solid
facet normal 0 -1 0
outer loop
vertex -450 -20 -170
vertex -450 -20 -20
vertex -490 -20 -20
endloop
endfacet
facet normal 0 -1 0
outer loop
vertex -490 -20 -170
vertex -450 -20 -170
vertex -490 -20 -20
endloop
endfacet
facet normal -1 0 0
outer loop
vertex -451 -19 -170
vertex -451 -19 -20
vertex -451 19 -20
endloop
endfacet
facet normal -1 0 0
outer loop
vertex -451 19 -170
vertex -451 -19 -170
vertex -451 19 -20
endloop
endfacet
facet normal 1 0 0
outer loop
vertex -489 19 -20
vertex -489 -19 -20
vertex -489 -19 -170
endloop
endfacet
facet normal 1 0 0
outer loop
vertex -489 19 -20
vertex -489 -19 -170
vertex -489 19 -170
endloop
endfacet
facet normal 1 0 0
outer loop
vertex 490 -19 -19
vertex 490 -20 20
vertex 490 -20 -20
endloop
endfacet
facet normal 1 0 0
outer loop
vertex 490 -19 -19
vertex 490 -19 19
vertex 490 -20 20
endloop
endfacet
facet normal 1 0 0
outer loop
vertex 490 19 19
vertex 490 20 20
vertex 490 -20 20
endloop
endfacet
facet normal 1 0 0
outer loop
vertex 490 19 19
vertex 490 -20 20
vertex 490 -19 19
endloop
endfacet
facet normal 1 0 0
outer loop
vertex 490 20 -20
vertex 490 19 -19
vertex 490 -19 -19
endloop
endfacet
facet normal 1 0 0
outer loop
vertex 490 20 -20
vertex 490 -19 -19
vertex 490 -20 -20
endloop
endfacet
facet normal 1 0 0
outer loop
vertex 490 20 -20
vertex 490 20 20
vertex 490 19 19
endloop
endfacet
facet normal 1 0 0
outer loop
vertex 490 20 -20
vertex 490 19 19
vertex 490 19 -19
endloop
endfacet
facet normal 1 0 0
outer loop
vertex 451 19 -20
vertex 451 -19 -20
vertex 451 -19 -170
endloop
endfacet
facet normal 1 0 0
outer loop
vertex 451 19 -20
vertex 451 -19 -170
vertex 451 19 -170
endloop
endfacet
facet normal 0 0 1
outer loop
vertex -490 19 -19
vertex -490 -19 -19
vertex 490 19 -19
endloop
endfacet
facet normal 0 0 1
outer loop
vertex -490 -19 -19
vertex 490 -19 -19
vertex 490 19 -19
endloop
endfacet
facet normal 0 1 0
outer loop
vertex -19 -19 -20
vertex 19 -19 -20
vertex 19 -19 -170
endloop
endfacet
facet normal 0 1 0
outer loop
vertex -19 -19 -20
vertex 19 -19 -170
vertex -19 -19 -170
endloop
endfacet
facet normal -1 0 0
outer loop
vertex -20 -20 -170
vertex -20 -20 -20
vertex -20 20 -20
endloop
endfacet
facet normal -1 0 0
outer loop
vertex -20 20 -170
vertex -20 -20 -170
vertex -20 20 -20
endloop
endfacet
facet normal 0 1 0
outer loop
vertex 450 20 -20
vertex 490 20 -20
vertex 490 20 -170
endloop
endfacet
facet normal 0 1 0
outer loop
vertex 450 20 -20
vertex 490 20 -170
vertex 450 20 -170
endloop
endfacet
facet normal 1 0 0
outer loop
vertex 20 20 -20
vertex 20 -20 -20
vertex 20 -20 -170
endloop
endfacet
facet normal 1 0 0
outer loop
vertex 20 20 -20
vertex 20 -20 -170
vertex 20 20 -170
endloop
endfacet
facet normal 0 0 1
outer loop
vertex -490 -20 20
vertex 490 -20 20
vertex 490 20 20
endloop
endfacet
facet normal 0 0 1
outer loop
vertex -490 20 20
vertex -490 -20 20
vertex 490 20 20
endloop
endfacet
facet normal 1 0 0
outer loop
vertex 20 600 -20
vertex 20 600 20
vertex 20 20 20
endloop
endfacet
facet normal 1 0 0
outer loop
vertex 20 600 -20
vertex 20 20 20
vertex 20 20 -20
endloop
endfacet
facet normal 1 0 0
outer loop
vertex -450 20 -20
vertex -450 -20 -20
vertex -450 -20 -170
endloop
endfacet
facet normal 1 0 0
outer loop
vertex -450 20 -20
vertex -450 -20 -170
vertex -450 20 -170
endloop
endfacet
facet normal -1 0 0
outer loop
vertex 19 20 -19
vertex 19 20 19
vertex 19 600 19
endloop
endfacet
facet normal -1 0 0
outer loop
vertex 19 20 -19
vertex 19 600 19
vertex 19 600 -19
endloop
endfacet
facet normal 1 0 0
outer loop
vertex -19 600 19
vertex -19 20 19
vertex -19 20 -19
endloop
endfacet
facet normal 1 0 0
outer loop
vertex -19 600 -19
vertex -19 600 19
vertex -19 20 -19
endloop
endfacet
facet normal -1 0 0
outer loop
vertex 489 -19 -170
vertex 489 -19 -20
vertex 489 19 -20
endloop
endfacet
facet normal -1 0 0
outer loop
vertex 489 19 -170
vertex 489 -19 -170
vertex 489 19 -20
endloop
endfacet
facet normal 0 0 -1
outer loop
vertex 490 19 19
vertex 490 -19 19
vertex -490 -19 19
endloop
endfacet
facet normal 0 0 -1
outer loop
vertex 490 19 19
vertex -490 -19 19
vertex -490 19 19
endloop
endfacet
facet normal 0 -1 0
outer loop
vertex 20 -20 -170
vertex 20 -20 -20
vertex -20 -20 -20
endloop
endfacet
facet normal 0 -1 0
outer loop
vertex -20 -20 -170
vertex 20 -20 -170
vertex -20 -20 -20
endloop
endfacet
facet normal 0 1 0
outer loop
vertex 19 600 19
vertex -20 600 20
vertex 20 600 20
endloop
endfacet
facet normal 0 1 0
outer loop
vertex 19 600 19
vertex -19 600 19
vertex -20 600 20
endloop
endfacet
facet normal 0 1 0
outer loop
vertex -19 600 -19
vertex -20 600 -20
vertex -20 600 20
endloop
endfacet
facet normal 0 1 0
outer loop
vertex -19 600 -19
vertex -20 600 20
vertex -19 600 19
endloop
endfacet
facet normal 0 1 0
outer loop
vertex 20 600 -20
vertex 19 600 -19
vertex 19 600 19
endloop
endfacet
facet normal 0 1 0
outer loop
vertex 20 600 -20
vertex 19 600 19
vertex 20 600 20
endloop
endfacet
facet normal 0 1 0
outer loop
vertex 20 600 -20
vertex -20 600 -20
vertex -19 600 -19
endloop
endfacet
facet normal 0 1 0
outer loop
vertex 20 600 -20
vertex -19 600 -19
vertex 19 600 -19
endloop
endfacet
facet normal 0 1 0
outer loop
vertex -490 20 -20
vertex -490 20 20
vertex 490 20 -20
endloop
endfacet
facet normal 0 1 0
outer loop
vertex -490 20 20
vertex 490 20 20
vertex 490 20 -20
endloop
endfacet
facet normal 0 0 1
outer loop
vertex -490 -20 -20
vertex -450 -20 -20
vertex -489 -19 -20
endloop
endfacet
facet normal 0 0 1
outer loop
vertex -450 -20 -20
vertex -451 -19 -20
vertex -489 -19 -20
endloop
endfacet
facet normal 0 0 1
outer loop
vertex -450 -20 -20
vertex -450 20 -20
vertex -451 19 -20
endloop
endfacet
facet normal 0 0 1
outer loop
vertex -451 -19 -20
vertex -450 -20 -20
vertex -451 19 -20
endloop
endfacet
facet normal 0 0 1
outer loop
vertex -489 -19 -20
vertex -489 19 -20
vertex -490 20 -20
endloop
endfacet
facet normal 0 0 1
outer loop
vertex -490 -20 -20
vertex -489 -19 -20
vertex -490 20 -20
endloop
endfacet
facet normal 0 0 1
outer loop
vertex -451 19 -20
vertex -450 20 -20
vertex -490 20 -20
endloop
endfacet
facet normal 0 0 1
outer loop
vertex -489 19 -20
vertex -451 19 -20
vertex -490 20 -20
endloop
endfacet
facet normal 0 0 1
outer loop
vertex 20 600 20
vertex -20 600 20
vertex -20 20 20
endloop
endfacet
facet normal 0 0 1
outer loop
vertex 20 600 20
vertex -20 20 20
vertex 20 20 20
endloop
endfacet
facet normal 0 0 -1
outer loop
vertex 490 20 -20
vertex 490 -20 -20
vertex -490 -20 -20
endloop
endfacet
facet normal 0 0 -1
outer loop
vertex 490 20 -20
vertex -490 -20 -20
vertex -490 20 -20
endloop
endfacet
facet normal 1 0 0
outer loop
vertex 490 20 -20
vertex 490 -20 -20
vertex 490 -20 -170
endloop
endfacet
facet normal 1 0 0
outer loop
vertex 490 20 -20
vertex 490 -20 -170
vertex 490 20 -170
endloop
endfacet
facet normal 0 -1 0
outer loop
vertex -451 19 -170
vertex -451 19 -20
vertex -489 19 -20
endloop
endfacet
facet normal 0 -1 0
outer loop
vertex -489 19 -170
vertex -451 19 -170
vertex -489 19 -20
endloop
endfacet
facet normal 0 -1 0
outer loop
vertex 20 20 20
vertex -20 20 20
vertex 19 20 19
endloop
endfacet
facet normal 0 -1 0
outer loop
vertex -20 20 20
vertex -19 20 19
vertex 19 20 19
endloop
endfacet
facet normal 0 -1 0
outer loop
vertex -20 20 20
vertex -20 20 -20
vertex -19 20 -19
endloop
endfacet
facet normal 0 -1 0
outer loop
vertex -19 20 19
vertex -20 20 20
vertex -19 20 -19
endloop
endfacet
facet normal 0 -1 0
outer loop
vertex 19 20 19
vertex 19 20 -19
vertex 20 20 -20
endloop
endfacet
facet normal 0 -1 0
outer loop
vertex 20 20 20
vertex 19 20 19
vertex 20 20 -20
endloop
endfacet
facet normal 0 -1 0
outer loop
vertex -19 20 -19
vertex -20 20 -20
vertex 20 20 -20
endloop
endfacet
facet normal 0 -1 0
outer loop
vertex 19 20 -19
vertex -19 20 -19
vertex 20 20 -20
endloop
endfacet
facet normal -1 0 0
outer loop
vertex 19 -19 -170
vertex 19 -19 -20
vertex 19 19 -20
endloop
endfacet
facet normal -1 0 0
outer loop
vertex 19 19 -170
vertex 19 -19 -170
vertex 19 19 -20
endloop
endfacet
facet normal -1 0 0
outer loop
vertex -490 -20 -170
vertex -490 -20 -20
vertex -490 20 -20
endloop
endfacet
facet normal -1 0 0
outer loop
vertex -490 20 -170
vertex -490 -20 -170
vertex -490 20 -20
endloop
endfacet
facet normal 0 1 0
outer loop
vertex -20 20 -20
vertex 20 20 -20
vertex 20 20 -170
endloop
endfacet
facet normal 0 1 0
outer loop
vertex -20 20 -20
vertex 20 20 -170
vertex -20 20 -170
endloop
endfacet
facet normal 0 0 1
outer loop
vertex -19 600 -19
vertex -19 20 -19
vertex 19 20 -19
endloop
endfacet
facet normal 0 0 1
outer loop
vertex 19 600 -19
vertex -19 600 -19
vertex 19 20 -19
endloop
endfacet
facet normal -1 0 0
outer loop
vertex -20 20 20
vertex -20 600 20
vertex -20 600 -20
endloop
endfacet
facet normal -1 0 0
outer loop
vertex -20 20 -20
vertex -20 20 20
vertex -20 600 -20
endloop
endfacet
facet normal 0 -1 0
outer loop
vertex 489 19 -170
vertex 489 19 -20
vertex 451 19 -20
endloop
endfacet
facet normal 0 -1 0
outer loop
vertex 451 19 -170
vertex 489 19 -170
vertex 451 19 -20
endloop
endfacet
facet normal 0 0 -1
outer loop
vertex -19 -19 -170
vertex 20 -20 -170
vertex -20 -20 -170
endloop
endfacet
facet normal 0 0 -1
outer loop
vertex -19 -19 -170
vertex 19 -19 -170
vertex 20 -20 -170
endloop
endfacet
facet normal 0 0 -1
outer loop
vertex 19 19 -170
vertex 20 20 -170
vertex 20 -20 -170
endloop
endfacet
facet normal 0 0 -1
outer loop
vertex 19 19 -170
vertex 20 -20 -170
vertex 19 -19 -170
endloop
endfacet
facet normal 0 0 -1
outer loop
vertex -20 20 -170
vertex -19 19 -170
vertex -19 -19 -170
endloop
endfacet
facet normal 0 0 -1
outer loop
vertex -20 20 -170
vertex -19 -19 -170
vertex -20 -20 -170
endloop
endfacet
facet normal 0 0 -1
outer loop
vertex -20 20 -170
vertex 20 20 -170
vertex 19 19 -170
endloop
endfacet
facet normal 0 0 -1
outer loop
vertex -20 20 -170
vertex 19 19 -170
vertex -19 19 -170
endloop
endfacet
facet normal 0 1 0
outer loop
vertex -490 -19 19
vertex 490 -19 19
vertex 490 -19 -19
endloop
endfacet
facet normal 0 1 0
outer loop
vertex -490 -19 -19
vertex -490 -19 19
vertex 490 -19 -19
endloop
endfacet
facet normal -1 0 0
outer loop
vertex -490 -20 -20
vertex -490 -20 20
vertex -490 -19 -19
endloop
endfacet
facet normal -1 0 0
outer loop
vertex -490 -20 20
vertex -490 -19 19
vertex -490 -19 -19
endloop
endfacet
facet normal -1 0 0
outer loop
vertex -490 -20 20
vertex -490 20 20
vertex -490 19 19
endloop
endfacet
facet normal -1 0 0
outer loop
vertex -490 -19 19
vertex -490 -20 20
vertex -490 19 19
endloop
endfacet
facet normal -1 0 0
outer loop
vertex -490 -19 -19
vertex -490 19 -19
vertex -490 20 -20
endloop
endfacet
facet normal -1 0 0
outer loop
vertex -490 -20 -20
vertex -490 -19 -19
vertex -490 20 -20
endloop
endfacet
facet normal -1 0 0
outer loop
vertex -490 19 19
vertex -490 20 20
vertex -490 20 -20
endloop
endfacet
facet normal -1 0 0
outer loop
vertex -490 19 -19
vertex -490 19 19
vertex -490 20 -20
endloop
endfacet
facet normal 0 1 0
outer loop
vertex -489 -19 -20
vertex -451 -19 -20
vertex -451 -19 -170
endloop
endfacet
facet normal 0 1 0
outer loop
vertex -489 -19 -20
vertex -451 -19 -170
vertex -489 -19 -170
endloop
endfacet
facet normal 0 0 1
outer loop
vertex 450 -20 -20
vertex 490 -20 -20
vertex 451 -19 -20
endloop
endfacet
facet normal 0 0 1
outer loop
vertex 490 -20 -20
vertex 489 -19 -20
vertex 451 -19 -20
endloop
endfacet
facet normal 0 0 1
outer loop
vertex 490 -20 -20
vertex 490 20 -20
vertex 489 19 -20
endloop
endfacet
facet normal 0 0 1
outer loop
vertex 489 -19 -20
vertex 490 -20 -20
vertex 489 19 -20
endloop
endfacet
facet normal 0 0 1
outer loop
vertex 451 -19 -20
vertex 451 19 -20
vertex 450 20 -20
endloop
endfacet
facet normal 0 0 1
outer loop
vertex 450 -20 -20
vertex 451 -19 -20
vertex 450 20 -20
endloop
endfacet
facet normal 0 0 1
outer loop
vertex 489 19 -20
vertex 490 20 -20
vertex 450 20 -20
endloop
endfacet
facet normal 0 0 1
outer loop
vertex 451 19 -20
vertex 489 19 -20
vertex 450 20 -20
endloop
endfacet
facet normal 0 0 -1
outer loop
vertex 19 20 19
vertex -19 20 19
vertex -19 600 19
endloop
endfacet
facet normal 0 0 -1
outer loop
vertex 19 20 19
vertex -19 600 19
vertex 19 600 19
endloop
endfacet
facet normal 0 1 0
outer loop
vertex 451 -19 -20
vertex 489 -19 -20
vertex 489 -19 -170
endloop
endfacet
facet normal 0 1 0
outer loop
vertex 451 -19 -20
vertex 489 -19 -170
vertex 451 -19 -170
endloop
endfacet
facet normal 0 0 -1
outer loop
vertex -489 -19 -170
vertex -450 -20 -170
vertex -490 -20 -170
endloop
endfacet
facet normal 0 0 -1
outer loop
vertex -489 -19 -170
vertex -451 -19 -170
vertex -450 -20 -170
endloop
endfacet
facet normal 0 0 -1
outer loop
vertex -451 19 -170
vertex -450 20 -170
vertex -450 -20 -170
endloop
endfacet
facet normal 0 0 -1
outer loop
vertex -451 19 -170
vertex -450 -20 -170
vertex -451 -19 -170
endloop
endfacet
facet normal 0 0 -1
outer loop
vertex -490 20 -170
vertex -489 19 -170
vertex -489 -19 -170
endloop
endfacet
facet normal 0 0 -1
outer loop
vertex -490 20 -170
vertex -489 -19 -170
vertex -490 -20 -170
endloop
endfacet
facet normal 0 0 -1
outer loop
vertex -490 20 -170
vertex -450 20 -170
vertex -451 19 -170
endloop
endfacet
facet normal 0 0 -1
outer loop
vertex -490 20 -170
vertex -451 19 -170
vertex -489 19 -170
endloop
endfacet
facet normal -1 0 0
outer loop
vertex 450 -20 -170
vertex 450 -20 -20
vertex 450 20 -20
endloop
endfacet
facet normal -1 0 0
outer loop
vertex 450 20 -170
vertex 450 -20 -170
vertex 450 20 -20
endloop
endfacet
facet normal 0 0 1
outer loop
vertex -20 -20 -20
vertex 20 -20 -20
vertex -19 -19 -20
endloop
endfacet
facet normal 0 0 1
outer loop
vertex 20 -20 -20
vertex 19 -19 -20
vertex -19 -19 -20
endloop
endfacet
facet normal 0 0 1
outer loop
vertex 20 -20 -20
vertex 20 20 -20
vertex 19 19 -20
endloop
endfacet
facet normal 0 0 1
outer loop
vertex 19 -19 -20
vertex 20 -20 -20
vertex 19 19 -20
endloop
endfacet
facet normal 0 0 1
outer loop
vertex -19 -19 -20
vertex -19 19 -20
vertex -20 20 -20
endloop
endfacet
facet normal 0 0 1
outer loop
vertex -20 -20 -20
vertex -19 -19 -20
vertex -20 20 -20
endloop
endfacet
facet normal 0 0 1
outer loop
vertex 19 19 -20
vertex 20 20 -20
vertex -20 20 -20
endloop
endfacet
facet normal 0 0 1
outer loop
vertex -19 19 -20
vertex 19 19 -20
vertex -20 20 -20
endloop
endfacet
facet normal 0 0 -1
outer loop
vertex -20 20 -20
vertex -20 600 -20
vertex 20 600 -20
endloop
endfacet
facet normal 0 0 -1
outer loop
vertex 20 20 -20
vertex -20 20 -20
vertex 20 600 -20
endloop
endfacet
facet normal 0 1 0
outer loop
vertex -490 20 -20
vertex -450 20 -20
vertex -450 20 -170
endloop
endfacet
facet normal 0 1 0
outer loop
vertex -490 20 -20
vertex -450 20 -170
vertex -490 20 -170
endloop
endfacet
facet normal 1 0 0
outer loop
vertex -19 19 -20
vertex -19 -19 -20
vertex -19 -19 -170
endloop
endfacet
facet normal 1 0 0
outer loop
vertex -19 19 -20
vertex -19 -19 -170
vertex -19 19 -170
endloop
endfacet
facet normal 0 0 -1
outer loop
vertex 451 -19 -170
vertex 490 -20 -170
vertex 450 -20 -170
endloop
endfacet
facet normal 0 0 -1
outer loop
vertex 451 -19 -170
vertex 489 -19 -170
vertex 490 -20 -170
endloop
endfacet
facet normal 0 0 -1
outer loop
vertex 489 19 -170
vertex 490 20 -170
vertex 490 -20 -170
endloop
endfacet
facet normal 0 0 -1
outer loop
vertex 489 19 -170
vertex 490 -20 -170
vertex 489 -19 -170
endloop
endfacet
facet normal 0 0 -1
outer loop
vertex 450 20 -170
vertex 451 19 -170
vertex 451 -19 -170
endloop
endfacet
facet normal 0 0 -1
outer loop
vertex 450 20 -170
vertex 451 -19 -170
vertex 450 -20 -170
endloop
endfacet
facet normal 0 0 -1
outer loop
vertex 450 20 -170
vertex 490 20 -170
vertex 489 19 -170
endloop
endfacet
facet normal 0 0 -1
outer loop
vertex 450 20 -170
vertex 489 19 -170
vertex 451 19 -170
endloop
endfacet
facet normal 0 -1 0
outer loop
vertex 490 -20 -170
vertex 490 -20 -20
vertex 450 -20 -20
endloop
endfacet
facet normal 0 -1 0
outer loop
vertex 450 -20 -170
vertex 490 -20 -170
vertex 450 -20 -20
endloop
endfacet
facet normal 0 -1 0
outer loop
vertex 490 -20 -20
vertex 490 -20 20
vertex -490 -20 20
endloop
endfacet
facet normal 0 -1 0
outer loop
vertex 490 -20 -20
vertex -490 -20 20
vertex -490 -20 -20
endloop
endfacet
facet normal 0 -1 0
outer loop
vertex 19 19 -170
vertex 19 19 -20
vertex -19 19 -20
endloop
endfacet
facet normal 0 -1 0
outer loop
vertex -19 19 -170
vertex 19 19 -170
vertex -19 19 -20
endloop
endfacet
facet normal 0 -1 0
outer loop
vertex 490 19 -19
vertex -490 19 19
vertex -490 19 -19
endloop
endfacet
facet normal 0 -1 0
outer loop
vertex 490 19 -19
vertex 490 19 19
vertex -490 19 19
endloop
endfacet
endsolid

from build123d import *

# Parameters (mm, degrees)
CROQUIS1_W              = 40
CROQUIS1_H              = 40
CROQUIS1_W_2            = 38
CROQUIS1_H_2            = 38
EXTRUIR_L_MINA1_DEPTH   = 490
CROQUIS2_W              = 40
CROQUIS2_H              = 40
CROQUIS2_W_2            = 38
CROQUIS2_H_2            = 38
EXTRUIR_L_MINA3_DEPTH   = 150
CROQUIS3_W              = 40
CROQUIS3_H              = 40
CROQUIS3_W_2            = 38
CROQUIS3_H_2            = 38
EXTRUIR_L_MINA5_DEPTH   = 150
EXTRUIR_L_MINA5_2_DEPTH = 150
CROQUIS4_W              = 40
CROQUIS4_H              = 40
CROQUIS4_W_2            = 38
CROQUIS4_H_2            = 38
EXTRUIR_L_MINA6_DEPTH   = 580


with BuildPart() as part:
    # Croquis1 → Extruir-Lámina1 (new, symmetric)
    with BuildSketch(Plane(origin=(0, 0, 0), x_dir=(0, 0, -1), z_dir=(1, 0, 0))):
        Rectangle(CROQUIS1_W, CROQUIS1_H)
        Rectangle(CROQUIS1_W_2, CROQUIS1_H_2, mode=Mode.SUBTRACT)
    extrude(amount=EXTRUIR_L_MINA1_DEPTH, both=True)


with BuildPart() as body_2:
    # Croquis2 → Extruir-Lámina3 (new body)
    with BuildSketch(Plane(origin=(0, 0, -20), x_dir=(-1, 0, 0), z_dir=(0, 0, -1))):
        Rectangle(CROQUIS2_W, CROQUIS2_H)
        Rectangle(CROQUIS2_W_2, CROQUIS2_H_2, mode=Mode.SUBTRACT)
    extrude(amount=EXTRUIR_L_MINA3_DEPTH)


with BuildPart() as body_3:
    # Croquis3 → Extruir-Lámina5 (new body)
    with BuildSketch(Plane(origin=(0, 0, -20), x_dir=(-1, 0, 0), z_dir=(0, 0, -1))):
        with Locations((-470, 0)):
            Rectangle(CROQUIS3_W, CROQUIS3_H)
        with Locations((-470, 0)):
            Rectangle(CROQUIS3_W_2, CROQUIS3_H_2, mode=Mode.SUBTRACT)
    extrude(amount=EXTRUIR_L_MINA5_DEPTH)


with BuildPart() as body_4:
    # Croquis3 → Extruir-L_mina5 2 (new body)
    with BuildSketch(Plane(origin=(0, 0, -20), x_dir=(-1, 0, 0), z_dir=(0, 0, -1))):
        with Locations((470, 0)):
            Rectangle(CROQUIS3_W, CROQUIS3_H)
        with Locations((470, 0)):
            Rectangle(CROQUIS3_W_2, CROQUIS3_H_2, mode=Mode.SUBTRACT)
    extrude(amount=EXTRUIR_L_MINA5_2_DEPTH)


with BuildPart() as body_5:
    # Croquis4 → Extruir-Lámina6 (new body)
    with BuildSketch(Plane(origin=(0, 20, 0), x_dir=(1, 0, 0), z_dir=(0, 1, 0))):
        Rectangle(CROQUIS4_W, CROQUIS4_H)
        Rectangle(CROQUIS4_W_2, CROQUIS4_H_2, mode=Mode.SUBTRACT)
    extrude(amount=EXTRUIR_L_MINA6_DEPTH)


solid = Compound([part.part, body_2.part, body_3.part, body_4.part, body_5.part])
